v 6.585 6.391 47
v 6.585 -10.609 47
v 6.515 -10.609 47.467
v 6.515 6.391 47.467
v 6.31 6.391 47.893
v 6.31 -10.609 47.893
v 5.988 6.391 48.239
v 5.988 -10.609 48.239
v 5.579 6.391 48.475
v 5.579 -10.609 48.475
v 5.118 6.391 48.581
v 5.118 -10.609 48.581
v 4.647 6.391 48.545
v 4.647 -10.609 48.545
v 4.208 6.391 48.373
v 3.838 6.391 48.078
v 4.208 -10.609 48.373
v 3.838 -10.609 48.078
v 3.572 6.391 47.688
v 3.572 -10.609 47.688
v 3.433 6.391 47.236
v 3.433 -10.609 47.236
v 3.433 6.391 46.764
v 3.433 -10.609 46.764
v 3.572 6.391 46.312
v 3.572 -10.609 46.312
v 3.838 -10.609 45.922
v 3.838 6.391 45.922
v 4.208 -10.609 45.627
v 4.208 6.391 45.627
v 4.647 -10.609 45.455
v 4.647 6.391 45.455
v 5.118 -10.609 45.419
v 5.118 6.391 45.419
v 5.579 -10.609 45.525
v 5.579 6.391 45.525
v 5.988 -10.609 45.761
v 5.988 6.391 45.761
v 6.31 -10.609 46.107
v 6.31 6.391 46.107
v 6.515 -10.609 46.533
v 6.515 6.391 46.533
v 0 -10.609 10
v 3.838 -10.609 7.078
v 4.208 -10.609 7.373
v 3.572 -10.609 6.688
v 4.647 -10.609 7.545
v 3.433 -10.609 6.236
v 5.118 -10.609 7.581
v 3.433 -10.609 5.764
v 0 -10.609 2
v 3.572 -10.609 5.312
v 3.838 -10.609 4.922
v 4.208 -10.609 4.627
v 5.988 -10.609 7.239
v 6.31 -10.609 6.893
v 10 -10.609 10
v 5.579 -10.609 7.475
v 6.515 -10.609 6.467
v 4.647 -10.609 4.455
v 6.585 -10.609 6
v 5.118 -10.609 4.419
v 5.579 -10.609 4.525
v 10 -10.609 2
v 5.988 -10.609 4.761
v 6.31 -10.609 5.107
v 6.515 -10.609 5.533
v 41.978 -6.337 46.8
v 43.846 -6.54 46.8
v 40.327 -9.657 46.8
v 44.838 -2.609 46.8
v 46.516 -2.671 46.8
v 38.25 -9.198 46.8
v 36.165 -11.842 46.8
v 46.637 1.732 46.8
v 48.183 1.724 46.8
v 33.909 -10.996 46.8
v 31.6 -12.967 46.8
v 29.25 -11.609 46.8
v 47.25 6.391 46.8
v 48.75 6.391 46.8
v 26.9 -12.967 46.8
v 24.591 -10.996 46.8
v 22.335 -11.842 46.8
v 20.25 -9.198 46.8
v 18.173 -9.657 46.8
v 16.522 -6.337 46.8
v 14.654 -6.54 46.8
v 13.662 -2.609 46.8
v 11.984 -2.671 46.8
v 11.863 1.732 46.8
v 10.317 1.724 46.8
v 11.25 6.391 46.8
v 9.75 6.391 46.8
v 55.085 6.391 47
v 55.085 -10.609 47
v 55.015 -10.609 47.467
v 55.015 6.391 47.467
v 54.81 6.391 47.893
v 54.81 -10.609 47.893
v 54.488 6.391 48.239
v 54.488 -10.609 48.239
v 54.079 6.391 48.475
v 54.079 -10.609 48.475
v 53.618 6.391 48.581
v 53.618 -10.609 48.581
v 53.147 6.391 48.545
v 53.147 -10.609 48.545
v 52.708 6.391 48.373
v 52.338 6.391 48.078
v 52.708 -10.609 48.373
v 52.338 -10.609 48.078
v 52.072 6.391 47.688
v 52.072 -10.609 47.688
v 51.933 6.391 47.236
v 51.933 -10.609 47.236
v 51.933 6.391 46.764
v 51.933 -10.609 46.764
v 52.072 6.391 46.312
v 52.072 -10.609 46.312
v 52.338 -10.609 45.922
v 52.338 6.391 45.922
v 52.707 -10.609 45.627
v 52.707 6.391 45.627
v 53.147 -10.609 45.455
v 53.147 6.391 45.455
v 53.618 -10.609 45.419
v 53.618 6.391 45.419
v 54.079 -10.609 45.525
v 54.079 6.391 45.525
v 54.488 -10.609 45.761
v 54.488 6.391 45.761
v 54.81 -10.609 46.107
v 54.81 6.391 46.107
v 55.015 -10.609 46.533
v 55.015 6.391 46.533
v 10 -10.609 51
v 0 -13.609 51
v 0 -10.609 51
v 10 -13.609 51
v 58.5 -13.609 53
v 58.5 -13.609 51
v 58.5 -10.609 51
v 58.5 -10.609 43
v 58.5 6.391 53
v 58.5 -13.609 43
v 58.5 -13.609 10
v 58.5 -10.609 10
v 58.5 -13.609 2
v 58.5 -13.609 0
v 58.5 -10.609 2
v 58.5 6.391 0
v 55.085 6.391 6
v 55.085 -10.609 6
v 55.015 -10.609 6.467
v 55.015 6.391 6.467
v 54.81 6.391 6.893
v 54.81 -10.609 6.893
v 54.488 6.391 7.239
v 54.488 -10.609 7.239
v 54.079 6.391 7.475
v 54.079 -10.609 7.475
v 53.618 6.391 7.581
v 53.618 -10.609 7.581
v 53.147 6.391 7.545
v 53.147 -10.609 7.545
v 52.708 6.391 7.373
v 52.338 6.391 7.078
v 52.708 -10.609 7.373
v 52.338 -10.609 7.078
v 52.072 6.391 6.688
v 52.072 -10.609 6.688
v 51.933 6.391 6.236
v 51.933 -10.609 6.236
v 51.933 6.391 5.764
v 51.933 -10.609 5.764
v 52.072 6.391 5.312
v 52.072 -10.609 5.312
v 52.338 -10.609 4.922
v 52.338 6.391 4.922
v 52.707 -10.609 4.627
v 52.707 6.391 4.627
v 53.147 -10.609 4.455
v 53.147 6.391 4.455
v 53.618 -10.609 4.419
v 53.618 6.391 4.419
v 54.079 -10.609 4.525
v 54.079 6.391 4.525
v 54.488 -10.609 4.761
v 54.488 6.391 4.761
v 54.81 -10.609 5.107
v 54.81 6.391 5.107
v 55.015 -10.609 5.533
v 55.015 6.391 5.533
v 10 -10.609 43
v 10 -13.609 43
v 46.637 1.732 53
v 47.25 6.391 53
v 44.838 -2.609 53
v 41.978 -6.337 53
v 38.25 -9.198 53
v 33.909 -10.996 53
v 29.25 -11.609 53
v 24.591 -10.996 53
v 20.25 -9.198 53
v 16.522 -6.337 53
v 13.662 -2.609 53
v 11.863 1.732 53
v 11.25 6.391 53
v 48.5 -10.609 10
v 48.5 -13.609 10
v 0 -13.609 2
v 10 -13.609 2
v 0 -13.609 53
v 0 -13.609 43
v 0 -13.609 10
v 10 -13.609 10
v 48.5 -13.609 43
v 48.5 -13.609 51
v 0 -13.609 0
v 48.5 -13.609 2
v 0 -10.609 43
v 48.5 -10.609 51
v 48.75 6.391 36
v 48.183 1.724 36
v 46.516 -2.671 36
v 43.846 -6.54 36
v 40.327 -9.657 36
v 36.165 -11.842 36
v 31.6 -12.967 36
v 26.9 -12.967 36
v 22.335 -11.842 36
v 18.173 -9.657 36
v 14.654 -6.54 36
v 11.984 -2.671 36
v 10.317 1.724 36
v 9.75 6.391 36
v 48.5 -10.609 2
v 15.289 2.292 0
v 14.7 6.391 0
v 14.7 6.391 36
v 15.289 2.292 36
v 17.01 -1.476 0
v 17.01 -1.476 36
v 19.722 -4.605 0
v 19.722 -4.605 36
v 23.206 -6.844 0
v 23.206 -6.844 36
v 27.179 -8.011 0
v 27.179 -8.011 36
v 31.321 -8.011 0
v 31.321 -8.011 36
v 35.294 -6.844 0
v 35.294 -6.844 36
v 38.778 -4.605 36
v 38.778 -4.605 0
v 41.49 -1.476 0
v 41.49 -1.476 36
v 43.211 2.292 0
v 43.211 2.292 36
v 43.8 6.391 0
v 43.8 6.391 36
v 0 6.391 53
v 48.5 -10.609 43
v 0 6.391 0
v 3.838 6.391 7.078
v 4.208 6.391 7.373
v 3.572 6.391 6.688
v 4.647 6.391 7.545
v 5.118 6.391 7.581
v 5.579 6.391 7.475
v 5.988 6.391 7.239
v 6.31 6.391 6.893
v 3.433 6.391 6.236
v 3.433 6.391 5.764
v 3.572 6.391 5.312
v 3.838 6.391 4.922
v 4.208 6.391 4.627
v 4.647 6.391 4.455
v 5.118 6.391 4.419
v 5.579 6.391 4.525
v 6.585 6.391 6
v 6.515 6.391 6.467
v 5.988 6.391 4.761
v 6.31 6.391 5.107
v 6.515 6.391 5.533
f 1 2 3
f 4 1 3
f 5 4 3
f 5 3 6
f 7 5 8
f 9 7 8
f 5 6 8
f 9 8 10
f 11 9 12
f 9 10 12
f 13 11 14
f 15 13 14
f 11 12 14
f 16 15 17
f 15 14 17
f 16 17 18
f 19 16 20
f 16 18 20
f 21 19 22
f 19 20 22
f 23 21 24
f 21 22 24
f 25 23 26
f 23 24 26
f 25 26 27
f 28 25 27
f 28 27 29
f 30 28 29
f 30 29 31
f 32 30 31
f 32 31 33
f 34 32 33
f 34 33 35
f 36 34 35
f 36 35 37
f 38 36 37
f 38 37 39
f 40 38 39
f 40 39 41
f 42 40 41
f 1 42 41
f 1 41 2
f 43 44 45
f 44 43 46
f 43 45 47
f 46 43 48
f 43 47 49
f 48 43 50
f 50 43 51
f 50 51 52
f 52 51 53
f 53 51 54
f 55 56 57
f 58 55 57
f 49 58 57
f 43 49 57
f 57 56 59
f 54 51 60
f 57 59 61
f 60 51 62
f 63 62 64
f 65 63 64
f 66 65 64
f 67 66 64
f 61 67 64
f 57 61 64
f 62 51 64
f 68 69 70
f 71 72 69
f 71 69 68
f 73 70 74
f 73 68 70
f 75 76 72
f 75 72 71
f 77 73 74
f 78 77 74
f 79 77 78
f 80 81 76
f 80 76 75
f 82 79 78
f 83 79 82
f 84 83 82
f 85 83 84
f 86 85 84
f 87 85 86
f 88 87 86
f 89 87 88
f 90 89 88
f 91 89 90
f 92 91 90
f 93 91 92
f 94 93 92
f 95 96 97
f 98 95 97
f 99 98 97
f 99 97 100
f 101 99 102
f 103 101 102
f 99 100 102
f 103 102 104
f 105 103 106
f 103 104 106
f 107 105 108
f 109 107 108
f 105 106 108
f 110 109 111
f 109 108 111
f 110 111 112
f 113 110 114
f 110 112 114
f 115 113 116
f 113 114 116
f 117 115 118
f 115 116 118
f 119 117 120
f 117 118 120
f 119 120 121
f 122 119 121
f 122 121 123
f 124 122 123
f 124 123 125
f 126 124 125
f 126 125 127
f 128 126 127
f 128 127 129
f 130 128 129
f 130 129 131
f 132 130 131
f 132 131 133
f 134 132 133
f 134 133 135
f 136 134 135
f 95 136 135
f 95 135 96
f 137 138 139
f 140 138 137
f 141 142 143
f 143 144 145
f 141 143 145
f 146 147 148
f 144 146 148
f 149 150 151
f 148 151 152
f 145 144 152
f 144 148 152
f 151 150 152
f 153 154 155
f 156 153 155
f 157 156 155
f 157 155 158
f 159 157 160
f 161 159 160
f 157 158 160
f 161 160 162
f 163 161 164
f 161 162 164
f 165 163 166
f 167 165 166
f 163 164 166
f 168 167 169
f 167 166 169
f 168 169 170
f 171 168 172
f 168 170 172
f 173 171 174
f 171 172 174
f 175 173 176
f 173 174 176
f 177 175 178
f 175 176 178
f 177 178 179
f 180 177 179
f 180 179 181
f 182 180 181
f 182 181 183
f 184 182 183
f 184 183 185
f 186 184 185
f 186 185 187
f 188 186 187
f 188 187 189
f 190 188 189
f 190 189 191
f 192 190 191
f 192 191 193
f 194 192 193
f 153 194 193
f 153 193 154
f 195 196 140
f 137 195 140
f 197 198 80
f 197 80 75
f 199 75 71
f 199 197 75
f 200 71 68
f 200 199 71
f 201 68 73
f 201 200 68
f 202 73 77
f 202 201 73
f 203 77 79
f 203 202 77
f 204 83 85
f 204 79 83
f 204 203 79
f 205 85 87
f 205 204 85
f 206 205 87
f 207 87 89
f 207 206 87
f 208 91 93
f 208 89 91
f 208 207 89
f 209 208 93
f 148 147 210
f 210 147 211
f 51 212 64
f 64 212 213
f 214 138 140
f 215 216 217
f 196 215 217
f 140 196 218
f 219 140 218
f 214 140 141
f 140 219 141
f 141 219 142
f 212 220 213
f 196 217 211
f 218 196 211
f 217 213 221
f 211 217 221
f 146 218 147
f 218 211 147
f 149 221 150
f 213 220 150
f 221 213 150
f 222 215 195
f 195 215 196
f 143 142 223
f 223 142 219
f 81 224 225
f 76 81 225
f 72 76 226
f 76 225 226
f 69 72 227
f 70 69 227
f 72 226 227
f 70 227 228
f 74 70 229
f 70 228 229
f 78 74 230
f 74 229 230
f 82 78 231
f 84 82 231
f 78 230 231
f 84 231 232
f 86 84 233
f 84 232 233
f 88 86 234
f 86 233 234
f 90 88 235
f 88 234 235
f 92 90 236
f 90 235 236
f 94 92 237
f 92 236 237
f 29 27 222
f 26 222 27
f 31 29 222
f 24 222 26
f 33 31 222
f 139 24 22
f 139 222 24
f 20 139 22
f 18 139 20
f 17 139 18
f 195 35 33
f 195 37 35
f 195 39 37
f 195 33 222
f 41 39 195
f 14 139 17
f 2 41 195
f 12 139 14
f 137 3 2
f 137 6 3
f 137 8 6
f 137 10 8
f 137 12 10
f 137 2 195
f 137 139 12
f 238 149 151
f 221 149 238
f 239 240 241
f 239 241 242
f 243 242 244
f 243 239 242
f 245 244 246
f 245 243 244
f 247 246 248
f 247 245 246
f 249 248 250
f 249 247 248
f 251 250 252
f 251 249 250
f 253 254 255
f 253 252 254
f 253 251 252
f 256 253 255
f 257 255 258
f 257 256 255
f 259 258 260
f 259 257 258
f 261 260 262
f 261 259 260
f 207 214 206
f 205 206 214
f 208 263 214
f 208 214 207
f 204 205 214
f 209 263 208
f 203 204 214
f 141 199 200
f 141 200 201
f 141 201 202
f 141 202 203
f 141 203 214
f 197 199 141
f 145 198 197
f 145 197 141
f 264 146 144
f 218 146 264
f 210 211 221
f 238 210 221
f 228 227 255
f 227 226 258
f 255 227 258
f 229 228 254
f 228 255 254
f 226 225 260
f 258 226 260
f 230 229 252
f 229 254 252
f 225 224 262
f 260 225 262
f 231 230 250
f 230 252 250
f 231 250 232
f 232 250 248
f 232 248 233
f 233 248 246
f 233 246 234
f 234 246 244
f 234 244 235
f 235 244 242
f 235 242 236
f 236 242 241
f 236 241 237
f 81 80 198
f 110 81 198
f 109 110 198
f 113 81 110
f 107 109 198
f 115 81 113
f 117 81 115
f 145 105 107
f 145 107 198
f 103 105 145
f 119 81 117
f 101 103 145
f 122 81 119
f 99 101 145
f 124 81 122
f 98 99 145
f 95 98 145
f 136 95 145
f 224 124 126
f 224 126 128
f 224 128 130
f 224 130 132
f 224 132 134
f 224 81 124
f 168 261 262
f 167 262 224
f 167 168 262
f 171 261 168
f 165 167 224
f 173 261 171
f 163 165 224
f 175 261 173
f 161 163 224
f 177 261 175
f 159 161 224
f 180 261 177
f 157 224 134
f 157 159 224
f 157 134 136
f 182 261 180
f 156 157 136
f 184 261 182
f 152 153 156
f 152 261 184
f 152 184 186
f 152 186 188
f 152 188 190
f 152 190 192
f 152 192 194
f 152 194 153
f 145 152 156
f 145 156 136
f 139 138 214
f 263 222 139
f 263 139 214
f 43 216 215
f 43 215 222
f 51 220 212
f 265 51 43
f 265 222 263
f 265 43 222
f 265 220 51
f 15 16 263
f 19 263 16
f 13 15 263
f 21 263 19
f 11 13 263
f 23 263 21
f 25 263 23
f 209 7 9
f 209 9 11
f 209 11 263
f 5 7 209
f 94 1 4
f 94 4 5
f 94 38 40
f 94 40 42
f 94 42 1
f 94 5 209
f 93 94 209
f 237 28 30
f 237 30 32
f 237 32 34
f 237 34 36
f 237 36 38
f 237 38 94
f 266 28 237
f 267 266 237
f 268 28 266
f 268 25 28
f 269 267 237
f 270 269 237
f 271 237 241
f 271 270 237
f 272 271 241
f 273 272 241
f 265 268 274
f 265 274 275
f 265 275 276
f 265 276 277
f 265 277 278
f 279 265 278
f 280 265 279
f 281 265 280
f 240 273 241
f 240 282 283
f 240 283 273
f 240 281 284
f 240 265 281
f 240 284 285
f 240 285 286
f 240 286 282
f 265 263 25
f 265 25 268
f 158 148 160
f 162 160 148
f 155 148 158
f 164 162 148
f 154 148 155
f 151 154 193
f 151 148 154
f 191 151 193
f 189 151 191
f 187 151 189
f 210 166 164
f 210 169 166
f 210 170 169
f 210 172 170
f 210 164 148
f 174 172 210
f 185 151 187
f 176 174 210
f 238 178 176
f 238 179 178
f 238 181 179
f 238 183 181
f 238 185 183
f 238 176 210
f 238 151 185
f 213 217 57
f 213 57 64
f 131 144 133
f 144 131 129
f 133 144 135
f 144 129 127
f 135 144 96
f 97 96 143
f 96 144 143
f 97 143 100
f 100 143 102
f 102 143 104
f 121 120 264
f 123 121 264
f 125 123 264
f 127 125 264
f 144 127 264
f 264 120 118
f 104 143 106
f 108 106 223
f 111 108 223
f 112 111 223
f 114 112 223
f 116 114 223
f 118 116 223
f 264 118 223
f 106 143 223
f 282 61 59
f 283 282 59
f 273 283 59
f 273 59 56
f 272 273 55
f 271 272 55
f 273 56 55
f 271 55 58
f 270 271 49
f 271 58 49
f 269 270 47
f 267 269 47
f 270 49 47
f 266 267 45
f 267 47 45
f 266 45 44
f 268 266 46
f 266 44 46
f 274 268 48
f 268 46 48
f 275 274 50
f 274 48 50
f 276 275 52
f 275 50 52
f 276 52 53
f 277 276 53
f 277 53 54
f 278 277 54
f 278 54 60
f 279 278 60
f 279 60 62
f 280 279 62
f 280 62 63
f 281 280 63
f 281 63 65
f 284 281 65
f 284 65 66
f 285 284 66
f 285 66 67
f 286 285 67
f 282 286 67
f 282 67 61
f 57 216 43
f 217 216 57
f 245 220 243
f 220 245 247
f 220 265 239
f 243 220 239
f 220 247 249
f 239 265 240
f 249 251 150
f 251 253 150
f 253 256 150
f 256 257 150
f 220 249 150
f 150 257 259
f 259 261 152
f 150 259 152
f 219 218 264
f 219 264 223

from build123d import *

# Parameters (mm, degrees)
SKETCH1_W                                  = 58.5
SKETCH1_H                                  = 20
BOSS_EXTRUDE1_DEPTH                        = 53
CUT_EXTRUDE2_DEPTH                         = 17
CUT_EXTRUDE3_DEPTH                         = 42.5
SKETCH8_W                                  = 10
SKETCH8_H                                  = 8
CUT_EXTRUDE6_DEPTH                         = 3
SKETCH7_R                                  = 1.585
CUT_EXTRUDE5_DEPTH                         = 92.5
MIRROR1_AT_THE_SECOND_PLANE_COPY_1_SKETC_W = 10
MIRROR1_AT_THE_SECOND_PLANE_COPY_1_SKETC_H = 8
MIRROR1_AT_THE_SECOND_PLANE_COPY_1_DEPTH   = 3
CUT_EXTRUDE7_DEPTH                         = 10.8


with BuildPart() as part:
    # Sketch1 → Boss-Extrude1 (new body)
    with BuildSketch(Plane.XY):
        with Locations((29.25, -3.609195402)):
            Rectangle(SKETCH1_W, SKETCH1_H)
    extrude(amount=BOSS_EXTRUDE1_DEPTH)

    # Sketch3 → Cut-Extrude2 (cut)
    with BuildSketch(Plane.XY.offset(53)):
        with BuildLine():
            Line((11.25, 6.390804598), (47.25, 6.390804598))
            ThreePointArc((47.25, 6.390804598), (29.25, -11.609195402), (11.25, 6.390804598))
        make_face()
    extrude(amount=-CUT_EXTRUDE2_DEPTH, mode=Mode.SUBTRACT)

    # Sketch5 → Cut-Extrude3 (cut)
    with BuildSketch(Plane(origin=(0, 0, 0), x_dir=(-1, 0, 0), z_dir=(0, 0, -1))):
        with BuildLine():
            Line((-43.8, 6.390804598), (-14.7, 6.390804598))
            ThreePointArc((-14.7, 6.390804598), (-29.25, -8.159195402), (-43.8, 6.390804598))
        make_face()
    extrude(amount=-CUT_EXTRUDE3_DEPTH, mode=Mode.SUBTRACT)

    # Sketch8 → Cut-Extrude6 (cut)
    with BuildSketch(Plane(origin=(0, -13.609195402, 0), x_dir=(-1, 0, 0), z_dir=(0, -1, 0))):
        with Locations((-53.5, -6)):
            Rectangle(SKETCH8_W, SKETCH8_H)
    cut_extrude6 = extrude(amount=-CUT_EXTRUDE6_DEPTH, mode=Mode.SUBTRACT)

    # Sketch7 → Cut-Extrude5 (cut)
    with BuildSketch(Plane(origin=(0, -13.609195402, 0), x_dir=(-1, 0, 0), z_dir=(0, -1, 0))):
        with Locations(Location((-53.5, -47, 0), (0, 0, 180))):
            Circle(SKETCH7_R)
        with Locations(Location((-53.5, -6, 0), (0, 0, 180))):
            Circle(SKETCH7_R)
        with Locations(Location((-5, -6, 0), (0, 0, 180))):
            Circle(SKETCH7_R)
        with Locations(Location((-5, -47, 0), (0, 0, 180))):
            Circle(SKETCH7_R)
    extrude(amount=-CUT_EXTRUDE5_DEPTH, mode=Mode.SUBTRACT)

    # Mirror1: Cut-Extrude6 across plane
    add(cut_extrude6.mirror(Plane.XY.offset(26.5)), mode=Mode.SUBTRACT)

    # Mirror1 at the second plane: Cut-Extrude6 across plane
    add(cut_extrude6.mirror(Plane.ZY.offset(-29.25)), mode=Mode.SUBTRACT)

    # Mirror1 at the second plane copy 1 sketc → Mirror1 at the second plane copy 1 (cut)
    with BuildSketch(Plane(origin=(58.5, -13.609195402, 53), x_dir=(1, 0, 0), z_dir=(0, -1, 0))):
        with Locations((-53.5, -6)):
            Rectangle(MIRROR1_AT_THE_SECOND_PLANE_COPY_1_SKETC_W, MIRROR1_AT_THE_SECOND_PLANE_COPY_1_SKETC_H)
    extrude(amount=-MIRROR1_AT_THE_SECOND_PLANE_COPY_1_DEPTH, mode=Mode.SUBTRACT)

    # Sketch11 → Cut-Extrude7 (cut)
    with BuildSketch(Plane.XY.offset(36)):
        with BuildLine():
            Line((9.75, 6.390804598), (48.75, 6.390804598))
            ThreePointArc((48.75, 6.390804598), (29.25, -13.109195402), (9.75, 6.390804598))
        make_face()
    extrude(amount=CUT_EXTRUDE7_DEPTH, mode=Mode.SUBTRACT)


solid = part.part
